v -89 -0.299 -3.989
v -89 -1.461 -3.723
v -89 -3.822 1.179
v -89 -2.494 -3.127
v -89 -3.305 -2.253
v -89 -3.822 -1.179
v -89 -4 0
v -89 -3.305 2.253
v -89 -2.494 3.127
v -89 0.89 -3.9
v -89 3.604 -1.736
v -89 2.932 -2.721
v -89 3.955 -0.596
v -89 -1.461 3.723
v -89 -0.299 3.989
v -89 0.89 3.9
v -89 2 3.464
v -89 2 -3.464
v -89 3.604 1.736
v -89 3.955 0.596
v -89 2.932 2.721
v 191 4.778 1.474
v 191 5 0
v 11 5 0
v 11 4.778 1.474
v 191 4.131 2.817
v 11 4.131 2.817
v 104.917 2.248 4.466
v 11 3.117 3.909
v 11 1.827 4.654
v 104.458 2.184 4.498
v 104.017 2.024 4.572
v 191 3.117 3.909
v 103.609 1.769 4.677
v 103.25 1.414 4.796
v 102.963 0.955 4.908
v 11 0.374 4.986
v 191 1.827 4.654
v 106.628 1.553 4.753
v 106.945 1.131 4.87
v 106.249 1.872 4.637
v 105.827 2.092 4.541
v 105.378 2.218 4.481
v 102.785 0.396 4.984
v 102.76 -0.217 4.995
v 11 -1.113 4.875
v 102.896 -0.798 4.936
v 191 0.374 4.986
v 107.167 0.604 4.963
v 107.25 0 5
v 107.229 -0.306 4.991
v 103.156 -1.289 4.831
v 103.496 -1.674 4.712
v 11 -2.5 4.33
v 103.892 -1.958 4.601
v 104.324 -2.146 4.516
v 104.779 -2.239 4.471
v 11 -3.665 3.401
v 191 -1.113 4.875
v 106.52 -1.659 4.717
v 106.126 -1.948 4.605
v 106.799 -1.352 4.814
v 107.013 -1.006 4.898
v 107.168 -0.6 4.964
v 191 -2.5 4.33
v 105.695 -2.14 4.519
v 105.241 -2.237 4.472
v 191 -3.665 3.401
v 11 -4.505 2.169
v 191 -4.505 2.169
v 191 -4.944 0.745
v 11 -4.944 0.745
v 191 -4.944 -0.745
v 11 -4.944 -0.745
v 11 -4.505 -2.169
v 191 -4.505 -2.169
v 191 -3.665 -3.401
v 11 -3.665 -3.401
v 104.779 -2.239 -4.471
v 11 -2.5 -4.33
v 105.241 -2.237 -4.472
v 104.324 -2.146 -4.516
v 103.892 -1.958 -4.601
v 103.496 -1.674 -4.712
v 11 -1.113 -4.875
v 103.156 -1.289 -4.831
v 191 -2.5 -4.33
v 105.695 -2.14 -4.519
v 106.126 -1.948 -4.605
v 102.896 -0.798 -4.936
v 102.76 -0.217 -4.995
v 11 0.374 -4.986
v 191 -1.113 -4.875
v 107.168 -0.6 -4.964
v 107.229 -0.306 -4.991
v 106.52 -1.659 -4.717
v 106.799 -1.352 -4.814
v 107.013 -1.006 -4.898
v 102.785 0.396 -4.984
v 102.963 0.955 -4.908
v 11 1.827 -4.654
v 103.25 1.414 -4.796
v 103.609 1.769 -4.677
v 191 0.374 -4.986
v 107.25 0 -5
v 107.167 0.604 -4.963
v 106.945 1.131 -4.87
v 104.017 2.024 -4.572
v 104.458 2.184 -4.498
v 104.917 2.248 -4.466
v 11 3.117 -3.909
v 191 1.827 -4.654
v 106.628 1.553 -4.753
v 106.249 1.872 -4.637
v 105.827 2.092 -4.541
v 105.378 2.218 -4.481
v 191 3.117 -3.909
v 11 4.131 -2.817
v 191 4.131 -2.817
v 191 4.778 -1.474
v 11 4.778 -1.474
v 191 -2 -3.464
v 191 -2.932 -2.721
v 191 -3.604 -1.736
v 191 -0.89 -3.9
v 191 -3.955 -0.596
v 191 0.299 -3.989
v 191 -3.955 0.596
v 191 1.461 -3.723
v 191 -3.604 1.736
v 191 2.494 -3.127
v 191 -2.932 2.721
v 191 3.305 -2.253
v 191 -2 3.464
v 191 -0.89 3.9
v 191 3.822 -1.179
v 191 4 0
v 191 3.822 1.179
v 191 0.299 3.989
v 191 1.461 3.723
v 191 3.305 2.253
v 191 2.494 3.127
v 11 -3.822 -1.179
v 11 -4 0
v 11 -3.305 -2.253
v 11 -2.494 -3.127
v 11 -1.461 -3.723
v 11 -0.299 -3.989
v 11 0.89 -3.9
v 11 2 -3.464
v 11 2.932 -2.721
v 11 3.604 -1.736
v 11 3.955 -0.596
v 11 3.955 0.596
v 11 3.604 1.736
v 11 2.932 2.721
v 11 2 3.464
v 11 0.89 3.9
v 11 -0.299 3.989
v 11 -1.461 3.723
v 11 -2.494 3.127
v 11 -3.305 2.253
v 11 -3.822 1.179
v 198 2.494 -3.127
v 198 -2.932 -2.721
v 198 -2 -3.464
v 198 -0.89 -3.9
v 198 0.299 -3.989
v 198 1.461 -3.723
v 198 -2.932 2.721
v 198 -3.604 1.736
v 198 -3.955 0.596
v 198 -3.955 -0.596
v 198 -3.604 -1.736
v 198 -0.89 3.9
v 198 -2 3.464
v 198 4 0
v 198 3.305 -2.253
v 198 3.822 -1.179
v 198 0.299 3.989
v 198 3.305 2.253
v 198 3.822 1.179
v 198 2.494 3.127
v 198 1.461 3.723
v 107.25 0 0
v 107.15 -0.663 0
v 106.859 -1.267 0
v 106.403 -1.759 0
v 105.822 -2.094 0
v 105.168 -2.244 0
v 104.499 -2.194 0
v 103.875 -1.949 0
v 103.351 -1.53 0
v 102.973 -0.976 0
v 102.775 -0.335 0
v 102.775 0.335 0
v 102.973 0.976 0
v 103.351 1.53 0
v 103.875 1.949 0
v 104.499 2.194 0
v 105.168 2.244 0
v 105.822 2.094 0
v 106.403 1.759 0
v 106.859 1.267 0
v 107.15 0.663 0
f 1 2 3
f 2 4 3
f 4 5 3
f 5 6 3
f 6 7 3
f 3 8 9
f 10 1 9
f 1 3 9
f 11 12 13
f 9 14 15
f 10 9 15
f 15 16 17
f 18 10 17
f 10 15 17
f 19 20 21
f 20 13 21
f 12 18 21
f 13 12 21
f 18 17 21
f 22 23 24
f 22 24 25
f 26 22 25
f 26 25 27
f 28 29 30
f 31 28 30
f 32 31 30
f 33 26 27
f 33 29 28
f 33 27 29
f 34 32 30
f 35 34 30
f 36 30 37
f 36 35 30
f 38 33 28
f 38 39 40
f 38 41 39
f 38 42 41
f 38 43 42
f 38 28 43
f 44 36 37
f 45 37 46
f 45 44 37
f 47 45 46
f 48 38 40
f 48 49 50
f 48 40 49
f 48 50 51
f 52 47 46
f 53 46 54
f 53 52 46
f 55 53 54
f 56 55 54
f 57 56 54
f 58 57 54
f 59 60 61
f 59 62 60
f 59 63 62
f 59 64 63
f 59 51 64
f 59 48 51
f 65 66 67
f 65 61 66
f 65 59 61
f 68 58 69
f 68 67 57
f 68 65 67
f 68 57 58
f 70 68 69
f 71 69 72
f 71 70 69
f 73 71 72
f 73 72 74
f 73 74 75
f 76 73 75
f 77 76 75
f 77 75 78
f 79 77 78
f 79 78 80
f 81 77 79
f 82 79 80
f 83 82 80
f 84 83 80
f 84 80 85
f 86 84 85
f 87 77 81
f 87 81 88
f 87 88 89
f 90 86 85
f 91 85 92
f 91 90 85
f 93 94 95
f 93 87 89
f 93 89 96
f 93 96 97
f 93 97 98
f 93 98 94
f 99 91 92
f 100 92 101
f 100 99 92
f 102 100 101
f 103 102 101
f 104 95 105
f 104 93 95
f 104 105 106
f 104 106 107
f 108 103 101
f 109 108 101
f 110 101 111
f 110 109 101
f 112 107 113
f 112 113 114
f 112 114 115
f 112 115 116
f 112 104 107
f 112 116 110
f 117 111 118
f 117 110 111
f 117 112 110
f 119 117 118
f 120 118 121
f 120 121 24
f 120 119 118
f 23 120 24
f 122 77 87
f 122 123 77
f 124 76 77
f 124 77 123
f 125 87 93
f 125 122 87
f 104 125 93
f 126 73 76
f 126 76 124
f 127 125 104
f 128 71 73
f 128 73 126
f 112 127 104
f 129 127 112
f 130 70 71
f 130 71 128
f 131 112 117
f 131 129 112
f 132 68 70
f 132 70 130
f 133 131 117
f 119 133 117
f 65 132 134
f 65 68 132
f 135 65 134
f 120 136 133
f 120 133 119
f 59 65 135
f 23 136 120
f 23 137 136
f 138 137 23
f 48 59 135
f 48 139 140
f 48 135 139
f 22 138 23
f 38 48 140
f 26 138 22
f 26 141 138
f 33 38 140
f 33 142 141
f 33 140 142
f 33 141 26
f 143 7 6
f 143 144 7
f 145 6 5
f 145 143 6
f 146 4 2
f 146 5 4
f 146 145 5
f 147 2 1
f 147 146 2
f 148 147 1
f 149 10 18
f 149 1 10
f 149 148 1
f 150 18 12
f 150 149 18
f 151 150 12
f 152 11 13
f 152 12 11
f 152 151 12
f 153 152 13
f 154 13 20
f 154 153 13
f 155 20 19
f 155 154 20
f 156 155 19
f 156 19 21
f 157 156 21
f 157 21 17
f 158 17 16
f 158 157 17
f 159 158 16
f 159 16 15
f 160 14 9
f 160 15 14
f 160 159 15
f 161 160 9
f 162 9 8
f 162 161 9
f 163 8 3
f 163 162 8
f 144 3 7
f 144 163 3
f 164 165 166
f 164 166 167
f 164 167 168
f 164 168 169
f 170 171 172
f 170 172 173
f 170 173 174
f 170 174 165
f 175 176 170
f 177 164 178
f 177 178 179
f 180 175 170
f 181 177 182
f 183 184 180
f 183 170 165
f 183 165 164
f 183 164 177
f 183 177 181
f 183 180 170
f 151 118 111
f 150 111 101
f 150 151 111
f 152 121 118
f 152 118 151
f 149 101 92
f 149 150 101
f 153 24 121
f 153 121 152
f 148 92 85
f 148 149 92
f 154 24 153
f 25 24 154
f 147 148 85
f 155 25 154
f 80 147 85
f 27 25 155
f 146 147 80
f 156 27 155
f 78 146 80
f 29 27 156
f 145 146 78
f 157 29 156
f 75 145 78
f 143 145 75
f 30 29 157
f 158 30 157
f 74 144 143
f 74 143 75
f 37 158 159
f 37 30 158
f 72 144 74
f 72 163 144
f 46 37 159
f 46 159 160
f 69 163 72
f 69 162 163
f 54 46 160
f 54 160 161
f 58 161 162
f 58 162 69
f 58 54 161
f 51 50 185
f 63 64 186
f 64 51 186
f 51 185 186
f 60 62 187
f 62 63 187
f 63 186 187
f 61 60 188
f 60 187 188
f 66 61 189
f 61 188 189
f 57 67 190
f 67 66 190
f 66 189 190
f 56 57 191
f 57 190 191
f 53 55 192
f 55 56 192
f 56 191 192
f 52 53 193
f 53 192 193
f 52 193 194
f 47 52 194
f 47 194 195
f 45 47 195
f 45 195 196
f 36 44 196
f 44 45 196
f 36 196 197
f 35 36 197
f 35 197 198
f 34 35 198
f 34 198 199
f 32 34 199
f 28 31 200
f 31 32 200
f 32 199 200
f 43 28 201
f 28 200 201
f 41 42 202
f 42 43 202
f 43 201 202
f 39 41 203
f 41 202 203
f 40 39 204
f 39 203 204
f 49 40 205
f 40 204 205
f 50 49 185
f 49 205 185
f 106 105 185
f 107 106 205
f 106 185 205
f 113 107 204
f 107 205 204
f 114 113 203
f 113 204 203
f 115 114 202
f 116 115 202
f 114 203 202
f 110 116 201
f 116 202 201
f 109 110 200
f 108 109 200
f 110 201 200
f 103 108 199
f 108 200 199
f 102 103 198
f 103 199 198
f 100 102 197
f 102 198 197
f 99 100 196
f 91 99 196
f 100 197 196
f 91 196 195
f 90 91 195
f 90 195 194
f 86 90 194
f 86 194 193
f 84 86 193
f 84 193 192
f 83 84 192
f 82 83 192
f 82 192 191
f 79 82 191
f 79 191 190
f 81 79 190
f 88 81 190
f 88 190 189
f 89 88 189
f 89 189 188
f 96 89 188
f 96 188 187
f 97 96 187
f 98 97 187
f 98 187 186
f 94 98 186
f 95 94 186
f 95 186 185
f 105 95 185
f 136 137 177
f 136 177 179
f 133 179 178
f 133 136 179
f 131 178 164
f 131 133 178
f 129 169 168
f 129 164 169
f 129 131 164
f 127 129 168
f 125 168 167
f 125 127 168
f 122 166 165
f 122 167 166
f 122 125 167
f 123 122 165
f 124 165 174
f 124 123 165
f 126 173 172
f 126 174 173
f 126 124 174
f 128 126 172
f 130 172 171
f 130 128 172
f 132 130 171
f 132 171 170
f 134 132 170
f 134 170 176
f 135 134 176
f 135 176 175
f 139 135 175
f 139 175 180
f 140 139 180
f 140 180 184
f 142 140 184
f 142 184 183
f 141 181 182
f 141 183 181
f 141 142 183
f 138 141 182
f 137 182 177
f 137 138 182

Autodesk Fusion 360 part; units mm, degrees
sketch "Sketch1" plane through (0, 0, 0) normal (1, 0, 0) x (0, 1, 0)
  circle A0 centre (0, 0) radius 5
  dimension "d1" = 10
extrude "Extrude1" add sketch "Sketch1" along normal blind 180
sketch "Sketch2" plane through (180, 0, 0) normal (1, 0, 0) x (0, 1, 0)
  circle A0 centre (0, 0) radius 5
  circle A1 centre (0, 0) radius 4
  dimension "d4" = 8
extrude "Extrude2" cut sketch "Sketch2" against normal blind 20
sketch "Sketch3" plane through (0, 0, 0) normal (-1, 0, 0) x (0, -1, 0)
  circle A0 centre (0, 0) radius 5
  circle A1 centre (0, 0) radius 4
  dimension "d7" = 8
extrude "Extrude3" cut sketch "Sketch3" against normal blind 100
extrude "Extrude4" add 1 faces at (160, 4.6332, -0.4471) along direction (1, 0, 0) blind 5
extrude "Extrude5" cut 1 faces at (180, -1.2456, 0.0132) along direction (-1, 0, 0) blind 5
extrude "Extrude6" add 1 faces at (175, -1.2456, 0.0132) along direction (1, 0, 0) blind 26
extrude "Extrude7" add 1 faces at (165, 4.6332, -0.4471) along direction (1, 0, 0) blind 26
extrude "Extrude8" add 1 faces at (100, 4.6332, 0.4471) along direction (-1, 0, 0) blind 26
extrude "Extrude9" cut 1 faces at (0, 0.2111, 0.732) along direction (1, 0, 0) blind 30.1
extrude "Extrude10" add 1 faces at (30.1, 0.2111, 0.732) along direction (-1, 0, 0) blind 0.1
extrude "Extrude11" cut 1 faces at (30, 0.2111, 0.732) along direction (1, 0, 0) blind 1
extrude "Extrude12" add 1 faces at (31, 0.2111, 0.732) along direction (-1, 0, 0) blind 10
extrude "Extrude13" add 1 faces at (21, 0.2111, 0.732) along direction (-1, 0, 0) blind 10
sketch "Sketch4" plane through (0, 0, 0) normal (0, 0, 1) x (1, 0, 0)
  line L0 (191, 0) -> (186, 0)
  circle A0 centre (186, 0) radius 2.25
  circle A1 centre (161, 0) radius 2.25
  dimension "d30" = 5
  dimension "d31" = 4.5
  dimension "d35" = 4.5
sketch "Sketch5" plane through (0, 0, 0) normal (0, 0, 1) x (1, 0, 0)
  circle A0 centre (161, 0) radius 2.25
  line L0 (191, -5) -> (191, 5)
  dimension "d38" = 4.5
  dimension "d39" = 30
extrude "Extrude17" add 1 faces at (11, 0.2111, 0.732) along direction (-1, 0, 0) blind 63
extrude "Extrude18" add 1 faces at (74, 4.6332, 0.4471) along direction (-1, 0, 0) blind 63
extrude "Extrude19" add 1 faces at (-52, 0.2111, 0.732) along direction (-1, 0, 0) blind 37
extrude "Extrude20" cut 1 faces at (201, -1.2456, 0.0132) along direction (-1, 0, 0) blind 3
sketch "Sketch6" plane through (0, 0, 0) normal (0, 0, 1) x (1, 0, 0)
  line L0 (190, 0) -> (105, 0)
  circle A0 centre (105, 0) radius 2.25
  dimension "d50" = 4.5
extrude "Extrude21" cut sketch "Sketch6" along normal mid plane 20
